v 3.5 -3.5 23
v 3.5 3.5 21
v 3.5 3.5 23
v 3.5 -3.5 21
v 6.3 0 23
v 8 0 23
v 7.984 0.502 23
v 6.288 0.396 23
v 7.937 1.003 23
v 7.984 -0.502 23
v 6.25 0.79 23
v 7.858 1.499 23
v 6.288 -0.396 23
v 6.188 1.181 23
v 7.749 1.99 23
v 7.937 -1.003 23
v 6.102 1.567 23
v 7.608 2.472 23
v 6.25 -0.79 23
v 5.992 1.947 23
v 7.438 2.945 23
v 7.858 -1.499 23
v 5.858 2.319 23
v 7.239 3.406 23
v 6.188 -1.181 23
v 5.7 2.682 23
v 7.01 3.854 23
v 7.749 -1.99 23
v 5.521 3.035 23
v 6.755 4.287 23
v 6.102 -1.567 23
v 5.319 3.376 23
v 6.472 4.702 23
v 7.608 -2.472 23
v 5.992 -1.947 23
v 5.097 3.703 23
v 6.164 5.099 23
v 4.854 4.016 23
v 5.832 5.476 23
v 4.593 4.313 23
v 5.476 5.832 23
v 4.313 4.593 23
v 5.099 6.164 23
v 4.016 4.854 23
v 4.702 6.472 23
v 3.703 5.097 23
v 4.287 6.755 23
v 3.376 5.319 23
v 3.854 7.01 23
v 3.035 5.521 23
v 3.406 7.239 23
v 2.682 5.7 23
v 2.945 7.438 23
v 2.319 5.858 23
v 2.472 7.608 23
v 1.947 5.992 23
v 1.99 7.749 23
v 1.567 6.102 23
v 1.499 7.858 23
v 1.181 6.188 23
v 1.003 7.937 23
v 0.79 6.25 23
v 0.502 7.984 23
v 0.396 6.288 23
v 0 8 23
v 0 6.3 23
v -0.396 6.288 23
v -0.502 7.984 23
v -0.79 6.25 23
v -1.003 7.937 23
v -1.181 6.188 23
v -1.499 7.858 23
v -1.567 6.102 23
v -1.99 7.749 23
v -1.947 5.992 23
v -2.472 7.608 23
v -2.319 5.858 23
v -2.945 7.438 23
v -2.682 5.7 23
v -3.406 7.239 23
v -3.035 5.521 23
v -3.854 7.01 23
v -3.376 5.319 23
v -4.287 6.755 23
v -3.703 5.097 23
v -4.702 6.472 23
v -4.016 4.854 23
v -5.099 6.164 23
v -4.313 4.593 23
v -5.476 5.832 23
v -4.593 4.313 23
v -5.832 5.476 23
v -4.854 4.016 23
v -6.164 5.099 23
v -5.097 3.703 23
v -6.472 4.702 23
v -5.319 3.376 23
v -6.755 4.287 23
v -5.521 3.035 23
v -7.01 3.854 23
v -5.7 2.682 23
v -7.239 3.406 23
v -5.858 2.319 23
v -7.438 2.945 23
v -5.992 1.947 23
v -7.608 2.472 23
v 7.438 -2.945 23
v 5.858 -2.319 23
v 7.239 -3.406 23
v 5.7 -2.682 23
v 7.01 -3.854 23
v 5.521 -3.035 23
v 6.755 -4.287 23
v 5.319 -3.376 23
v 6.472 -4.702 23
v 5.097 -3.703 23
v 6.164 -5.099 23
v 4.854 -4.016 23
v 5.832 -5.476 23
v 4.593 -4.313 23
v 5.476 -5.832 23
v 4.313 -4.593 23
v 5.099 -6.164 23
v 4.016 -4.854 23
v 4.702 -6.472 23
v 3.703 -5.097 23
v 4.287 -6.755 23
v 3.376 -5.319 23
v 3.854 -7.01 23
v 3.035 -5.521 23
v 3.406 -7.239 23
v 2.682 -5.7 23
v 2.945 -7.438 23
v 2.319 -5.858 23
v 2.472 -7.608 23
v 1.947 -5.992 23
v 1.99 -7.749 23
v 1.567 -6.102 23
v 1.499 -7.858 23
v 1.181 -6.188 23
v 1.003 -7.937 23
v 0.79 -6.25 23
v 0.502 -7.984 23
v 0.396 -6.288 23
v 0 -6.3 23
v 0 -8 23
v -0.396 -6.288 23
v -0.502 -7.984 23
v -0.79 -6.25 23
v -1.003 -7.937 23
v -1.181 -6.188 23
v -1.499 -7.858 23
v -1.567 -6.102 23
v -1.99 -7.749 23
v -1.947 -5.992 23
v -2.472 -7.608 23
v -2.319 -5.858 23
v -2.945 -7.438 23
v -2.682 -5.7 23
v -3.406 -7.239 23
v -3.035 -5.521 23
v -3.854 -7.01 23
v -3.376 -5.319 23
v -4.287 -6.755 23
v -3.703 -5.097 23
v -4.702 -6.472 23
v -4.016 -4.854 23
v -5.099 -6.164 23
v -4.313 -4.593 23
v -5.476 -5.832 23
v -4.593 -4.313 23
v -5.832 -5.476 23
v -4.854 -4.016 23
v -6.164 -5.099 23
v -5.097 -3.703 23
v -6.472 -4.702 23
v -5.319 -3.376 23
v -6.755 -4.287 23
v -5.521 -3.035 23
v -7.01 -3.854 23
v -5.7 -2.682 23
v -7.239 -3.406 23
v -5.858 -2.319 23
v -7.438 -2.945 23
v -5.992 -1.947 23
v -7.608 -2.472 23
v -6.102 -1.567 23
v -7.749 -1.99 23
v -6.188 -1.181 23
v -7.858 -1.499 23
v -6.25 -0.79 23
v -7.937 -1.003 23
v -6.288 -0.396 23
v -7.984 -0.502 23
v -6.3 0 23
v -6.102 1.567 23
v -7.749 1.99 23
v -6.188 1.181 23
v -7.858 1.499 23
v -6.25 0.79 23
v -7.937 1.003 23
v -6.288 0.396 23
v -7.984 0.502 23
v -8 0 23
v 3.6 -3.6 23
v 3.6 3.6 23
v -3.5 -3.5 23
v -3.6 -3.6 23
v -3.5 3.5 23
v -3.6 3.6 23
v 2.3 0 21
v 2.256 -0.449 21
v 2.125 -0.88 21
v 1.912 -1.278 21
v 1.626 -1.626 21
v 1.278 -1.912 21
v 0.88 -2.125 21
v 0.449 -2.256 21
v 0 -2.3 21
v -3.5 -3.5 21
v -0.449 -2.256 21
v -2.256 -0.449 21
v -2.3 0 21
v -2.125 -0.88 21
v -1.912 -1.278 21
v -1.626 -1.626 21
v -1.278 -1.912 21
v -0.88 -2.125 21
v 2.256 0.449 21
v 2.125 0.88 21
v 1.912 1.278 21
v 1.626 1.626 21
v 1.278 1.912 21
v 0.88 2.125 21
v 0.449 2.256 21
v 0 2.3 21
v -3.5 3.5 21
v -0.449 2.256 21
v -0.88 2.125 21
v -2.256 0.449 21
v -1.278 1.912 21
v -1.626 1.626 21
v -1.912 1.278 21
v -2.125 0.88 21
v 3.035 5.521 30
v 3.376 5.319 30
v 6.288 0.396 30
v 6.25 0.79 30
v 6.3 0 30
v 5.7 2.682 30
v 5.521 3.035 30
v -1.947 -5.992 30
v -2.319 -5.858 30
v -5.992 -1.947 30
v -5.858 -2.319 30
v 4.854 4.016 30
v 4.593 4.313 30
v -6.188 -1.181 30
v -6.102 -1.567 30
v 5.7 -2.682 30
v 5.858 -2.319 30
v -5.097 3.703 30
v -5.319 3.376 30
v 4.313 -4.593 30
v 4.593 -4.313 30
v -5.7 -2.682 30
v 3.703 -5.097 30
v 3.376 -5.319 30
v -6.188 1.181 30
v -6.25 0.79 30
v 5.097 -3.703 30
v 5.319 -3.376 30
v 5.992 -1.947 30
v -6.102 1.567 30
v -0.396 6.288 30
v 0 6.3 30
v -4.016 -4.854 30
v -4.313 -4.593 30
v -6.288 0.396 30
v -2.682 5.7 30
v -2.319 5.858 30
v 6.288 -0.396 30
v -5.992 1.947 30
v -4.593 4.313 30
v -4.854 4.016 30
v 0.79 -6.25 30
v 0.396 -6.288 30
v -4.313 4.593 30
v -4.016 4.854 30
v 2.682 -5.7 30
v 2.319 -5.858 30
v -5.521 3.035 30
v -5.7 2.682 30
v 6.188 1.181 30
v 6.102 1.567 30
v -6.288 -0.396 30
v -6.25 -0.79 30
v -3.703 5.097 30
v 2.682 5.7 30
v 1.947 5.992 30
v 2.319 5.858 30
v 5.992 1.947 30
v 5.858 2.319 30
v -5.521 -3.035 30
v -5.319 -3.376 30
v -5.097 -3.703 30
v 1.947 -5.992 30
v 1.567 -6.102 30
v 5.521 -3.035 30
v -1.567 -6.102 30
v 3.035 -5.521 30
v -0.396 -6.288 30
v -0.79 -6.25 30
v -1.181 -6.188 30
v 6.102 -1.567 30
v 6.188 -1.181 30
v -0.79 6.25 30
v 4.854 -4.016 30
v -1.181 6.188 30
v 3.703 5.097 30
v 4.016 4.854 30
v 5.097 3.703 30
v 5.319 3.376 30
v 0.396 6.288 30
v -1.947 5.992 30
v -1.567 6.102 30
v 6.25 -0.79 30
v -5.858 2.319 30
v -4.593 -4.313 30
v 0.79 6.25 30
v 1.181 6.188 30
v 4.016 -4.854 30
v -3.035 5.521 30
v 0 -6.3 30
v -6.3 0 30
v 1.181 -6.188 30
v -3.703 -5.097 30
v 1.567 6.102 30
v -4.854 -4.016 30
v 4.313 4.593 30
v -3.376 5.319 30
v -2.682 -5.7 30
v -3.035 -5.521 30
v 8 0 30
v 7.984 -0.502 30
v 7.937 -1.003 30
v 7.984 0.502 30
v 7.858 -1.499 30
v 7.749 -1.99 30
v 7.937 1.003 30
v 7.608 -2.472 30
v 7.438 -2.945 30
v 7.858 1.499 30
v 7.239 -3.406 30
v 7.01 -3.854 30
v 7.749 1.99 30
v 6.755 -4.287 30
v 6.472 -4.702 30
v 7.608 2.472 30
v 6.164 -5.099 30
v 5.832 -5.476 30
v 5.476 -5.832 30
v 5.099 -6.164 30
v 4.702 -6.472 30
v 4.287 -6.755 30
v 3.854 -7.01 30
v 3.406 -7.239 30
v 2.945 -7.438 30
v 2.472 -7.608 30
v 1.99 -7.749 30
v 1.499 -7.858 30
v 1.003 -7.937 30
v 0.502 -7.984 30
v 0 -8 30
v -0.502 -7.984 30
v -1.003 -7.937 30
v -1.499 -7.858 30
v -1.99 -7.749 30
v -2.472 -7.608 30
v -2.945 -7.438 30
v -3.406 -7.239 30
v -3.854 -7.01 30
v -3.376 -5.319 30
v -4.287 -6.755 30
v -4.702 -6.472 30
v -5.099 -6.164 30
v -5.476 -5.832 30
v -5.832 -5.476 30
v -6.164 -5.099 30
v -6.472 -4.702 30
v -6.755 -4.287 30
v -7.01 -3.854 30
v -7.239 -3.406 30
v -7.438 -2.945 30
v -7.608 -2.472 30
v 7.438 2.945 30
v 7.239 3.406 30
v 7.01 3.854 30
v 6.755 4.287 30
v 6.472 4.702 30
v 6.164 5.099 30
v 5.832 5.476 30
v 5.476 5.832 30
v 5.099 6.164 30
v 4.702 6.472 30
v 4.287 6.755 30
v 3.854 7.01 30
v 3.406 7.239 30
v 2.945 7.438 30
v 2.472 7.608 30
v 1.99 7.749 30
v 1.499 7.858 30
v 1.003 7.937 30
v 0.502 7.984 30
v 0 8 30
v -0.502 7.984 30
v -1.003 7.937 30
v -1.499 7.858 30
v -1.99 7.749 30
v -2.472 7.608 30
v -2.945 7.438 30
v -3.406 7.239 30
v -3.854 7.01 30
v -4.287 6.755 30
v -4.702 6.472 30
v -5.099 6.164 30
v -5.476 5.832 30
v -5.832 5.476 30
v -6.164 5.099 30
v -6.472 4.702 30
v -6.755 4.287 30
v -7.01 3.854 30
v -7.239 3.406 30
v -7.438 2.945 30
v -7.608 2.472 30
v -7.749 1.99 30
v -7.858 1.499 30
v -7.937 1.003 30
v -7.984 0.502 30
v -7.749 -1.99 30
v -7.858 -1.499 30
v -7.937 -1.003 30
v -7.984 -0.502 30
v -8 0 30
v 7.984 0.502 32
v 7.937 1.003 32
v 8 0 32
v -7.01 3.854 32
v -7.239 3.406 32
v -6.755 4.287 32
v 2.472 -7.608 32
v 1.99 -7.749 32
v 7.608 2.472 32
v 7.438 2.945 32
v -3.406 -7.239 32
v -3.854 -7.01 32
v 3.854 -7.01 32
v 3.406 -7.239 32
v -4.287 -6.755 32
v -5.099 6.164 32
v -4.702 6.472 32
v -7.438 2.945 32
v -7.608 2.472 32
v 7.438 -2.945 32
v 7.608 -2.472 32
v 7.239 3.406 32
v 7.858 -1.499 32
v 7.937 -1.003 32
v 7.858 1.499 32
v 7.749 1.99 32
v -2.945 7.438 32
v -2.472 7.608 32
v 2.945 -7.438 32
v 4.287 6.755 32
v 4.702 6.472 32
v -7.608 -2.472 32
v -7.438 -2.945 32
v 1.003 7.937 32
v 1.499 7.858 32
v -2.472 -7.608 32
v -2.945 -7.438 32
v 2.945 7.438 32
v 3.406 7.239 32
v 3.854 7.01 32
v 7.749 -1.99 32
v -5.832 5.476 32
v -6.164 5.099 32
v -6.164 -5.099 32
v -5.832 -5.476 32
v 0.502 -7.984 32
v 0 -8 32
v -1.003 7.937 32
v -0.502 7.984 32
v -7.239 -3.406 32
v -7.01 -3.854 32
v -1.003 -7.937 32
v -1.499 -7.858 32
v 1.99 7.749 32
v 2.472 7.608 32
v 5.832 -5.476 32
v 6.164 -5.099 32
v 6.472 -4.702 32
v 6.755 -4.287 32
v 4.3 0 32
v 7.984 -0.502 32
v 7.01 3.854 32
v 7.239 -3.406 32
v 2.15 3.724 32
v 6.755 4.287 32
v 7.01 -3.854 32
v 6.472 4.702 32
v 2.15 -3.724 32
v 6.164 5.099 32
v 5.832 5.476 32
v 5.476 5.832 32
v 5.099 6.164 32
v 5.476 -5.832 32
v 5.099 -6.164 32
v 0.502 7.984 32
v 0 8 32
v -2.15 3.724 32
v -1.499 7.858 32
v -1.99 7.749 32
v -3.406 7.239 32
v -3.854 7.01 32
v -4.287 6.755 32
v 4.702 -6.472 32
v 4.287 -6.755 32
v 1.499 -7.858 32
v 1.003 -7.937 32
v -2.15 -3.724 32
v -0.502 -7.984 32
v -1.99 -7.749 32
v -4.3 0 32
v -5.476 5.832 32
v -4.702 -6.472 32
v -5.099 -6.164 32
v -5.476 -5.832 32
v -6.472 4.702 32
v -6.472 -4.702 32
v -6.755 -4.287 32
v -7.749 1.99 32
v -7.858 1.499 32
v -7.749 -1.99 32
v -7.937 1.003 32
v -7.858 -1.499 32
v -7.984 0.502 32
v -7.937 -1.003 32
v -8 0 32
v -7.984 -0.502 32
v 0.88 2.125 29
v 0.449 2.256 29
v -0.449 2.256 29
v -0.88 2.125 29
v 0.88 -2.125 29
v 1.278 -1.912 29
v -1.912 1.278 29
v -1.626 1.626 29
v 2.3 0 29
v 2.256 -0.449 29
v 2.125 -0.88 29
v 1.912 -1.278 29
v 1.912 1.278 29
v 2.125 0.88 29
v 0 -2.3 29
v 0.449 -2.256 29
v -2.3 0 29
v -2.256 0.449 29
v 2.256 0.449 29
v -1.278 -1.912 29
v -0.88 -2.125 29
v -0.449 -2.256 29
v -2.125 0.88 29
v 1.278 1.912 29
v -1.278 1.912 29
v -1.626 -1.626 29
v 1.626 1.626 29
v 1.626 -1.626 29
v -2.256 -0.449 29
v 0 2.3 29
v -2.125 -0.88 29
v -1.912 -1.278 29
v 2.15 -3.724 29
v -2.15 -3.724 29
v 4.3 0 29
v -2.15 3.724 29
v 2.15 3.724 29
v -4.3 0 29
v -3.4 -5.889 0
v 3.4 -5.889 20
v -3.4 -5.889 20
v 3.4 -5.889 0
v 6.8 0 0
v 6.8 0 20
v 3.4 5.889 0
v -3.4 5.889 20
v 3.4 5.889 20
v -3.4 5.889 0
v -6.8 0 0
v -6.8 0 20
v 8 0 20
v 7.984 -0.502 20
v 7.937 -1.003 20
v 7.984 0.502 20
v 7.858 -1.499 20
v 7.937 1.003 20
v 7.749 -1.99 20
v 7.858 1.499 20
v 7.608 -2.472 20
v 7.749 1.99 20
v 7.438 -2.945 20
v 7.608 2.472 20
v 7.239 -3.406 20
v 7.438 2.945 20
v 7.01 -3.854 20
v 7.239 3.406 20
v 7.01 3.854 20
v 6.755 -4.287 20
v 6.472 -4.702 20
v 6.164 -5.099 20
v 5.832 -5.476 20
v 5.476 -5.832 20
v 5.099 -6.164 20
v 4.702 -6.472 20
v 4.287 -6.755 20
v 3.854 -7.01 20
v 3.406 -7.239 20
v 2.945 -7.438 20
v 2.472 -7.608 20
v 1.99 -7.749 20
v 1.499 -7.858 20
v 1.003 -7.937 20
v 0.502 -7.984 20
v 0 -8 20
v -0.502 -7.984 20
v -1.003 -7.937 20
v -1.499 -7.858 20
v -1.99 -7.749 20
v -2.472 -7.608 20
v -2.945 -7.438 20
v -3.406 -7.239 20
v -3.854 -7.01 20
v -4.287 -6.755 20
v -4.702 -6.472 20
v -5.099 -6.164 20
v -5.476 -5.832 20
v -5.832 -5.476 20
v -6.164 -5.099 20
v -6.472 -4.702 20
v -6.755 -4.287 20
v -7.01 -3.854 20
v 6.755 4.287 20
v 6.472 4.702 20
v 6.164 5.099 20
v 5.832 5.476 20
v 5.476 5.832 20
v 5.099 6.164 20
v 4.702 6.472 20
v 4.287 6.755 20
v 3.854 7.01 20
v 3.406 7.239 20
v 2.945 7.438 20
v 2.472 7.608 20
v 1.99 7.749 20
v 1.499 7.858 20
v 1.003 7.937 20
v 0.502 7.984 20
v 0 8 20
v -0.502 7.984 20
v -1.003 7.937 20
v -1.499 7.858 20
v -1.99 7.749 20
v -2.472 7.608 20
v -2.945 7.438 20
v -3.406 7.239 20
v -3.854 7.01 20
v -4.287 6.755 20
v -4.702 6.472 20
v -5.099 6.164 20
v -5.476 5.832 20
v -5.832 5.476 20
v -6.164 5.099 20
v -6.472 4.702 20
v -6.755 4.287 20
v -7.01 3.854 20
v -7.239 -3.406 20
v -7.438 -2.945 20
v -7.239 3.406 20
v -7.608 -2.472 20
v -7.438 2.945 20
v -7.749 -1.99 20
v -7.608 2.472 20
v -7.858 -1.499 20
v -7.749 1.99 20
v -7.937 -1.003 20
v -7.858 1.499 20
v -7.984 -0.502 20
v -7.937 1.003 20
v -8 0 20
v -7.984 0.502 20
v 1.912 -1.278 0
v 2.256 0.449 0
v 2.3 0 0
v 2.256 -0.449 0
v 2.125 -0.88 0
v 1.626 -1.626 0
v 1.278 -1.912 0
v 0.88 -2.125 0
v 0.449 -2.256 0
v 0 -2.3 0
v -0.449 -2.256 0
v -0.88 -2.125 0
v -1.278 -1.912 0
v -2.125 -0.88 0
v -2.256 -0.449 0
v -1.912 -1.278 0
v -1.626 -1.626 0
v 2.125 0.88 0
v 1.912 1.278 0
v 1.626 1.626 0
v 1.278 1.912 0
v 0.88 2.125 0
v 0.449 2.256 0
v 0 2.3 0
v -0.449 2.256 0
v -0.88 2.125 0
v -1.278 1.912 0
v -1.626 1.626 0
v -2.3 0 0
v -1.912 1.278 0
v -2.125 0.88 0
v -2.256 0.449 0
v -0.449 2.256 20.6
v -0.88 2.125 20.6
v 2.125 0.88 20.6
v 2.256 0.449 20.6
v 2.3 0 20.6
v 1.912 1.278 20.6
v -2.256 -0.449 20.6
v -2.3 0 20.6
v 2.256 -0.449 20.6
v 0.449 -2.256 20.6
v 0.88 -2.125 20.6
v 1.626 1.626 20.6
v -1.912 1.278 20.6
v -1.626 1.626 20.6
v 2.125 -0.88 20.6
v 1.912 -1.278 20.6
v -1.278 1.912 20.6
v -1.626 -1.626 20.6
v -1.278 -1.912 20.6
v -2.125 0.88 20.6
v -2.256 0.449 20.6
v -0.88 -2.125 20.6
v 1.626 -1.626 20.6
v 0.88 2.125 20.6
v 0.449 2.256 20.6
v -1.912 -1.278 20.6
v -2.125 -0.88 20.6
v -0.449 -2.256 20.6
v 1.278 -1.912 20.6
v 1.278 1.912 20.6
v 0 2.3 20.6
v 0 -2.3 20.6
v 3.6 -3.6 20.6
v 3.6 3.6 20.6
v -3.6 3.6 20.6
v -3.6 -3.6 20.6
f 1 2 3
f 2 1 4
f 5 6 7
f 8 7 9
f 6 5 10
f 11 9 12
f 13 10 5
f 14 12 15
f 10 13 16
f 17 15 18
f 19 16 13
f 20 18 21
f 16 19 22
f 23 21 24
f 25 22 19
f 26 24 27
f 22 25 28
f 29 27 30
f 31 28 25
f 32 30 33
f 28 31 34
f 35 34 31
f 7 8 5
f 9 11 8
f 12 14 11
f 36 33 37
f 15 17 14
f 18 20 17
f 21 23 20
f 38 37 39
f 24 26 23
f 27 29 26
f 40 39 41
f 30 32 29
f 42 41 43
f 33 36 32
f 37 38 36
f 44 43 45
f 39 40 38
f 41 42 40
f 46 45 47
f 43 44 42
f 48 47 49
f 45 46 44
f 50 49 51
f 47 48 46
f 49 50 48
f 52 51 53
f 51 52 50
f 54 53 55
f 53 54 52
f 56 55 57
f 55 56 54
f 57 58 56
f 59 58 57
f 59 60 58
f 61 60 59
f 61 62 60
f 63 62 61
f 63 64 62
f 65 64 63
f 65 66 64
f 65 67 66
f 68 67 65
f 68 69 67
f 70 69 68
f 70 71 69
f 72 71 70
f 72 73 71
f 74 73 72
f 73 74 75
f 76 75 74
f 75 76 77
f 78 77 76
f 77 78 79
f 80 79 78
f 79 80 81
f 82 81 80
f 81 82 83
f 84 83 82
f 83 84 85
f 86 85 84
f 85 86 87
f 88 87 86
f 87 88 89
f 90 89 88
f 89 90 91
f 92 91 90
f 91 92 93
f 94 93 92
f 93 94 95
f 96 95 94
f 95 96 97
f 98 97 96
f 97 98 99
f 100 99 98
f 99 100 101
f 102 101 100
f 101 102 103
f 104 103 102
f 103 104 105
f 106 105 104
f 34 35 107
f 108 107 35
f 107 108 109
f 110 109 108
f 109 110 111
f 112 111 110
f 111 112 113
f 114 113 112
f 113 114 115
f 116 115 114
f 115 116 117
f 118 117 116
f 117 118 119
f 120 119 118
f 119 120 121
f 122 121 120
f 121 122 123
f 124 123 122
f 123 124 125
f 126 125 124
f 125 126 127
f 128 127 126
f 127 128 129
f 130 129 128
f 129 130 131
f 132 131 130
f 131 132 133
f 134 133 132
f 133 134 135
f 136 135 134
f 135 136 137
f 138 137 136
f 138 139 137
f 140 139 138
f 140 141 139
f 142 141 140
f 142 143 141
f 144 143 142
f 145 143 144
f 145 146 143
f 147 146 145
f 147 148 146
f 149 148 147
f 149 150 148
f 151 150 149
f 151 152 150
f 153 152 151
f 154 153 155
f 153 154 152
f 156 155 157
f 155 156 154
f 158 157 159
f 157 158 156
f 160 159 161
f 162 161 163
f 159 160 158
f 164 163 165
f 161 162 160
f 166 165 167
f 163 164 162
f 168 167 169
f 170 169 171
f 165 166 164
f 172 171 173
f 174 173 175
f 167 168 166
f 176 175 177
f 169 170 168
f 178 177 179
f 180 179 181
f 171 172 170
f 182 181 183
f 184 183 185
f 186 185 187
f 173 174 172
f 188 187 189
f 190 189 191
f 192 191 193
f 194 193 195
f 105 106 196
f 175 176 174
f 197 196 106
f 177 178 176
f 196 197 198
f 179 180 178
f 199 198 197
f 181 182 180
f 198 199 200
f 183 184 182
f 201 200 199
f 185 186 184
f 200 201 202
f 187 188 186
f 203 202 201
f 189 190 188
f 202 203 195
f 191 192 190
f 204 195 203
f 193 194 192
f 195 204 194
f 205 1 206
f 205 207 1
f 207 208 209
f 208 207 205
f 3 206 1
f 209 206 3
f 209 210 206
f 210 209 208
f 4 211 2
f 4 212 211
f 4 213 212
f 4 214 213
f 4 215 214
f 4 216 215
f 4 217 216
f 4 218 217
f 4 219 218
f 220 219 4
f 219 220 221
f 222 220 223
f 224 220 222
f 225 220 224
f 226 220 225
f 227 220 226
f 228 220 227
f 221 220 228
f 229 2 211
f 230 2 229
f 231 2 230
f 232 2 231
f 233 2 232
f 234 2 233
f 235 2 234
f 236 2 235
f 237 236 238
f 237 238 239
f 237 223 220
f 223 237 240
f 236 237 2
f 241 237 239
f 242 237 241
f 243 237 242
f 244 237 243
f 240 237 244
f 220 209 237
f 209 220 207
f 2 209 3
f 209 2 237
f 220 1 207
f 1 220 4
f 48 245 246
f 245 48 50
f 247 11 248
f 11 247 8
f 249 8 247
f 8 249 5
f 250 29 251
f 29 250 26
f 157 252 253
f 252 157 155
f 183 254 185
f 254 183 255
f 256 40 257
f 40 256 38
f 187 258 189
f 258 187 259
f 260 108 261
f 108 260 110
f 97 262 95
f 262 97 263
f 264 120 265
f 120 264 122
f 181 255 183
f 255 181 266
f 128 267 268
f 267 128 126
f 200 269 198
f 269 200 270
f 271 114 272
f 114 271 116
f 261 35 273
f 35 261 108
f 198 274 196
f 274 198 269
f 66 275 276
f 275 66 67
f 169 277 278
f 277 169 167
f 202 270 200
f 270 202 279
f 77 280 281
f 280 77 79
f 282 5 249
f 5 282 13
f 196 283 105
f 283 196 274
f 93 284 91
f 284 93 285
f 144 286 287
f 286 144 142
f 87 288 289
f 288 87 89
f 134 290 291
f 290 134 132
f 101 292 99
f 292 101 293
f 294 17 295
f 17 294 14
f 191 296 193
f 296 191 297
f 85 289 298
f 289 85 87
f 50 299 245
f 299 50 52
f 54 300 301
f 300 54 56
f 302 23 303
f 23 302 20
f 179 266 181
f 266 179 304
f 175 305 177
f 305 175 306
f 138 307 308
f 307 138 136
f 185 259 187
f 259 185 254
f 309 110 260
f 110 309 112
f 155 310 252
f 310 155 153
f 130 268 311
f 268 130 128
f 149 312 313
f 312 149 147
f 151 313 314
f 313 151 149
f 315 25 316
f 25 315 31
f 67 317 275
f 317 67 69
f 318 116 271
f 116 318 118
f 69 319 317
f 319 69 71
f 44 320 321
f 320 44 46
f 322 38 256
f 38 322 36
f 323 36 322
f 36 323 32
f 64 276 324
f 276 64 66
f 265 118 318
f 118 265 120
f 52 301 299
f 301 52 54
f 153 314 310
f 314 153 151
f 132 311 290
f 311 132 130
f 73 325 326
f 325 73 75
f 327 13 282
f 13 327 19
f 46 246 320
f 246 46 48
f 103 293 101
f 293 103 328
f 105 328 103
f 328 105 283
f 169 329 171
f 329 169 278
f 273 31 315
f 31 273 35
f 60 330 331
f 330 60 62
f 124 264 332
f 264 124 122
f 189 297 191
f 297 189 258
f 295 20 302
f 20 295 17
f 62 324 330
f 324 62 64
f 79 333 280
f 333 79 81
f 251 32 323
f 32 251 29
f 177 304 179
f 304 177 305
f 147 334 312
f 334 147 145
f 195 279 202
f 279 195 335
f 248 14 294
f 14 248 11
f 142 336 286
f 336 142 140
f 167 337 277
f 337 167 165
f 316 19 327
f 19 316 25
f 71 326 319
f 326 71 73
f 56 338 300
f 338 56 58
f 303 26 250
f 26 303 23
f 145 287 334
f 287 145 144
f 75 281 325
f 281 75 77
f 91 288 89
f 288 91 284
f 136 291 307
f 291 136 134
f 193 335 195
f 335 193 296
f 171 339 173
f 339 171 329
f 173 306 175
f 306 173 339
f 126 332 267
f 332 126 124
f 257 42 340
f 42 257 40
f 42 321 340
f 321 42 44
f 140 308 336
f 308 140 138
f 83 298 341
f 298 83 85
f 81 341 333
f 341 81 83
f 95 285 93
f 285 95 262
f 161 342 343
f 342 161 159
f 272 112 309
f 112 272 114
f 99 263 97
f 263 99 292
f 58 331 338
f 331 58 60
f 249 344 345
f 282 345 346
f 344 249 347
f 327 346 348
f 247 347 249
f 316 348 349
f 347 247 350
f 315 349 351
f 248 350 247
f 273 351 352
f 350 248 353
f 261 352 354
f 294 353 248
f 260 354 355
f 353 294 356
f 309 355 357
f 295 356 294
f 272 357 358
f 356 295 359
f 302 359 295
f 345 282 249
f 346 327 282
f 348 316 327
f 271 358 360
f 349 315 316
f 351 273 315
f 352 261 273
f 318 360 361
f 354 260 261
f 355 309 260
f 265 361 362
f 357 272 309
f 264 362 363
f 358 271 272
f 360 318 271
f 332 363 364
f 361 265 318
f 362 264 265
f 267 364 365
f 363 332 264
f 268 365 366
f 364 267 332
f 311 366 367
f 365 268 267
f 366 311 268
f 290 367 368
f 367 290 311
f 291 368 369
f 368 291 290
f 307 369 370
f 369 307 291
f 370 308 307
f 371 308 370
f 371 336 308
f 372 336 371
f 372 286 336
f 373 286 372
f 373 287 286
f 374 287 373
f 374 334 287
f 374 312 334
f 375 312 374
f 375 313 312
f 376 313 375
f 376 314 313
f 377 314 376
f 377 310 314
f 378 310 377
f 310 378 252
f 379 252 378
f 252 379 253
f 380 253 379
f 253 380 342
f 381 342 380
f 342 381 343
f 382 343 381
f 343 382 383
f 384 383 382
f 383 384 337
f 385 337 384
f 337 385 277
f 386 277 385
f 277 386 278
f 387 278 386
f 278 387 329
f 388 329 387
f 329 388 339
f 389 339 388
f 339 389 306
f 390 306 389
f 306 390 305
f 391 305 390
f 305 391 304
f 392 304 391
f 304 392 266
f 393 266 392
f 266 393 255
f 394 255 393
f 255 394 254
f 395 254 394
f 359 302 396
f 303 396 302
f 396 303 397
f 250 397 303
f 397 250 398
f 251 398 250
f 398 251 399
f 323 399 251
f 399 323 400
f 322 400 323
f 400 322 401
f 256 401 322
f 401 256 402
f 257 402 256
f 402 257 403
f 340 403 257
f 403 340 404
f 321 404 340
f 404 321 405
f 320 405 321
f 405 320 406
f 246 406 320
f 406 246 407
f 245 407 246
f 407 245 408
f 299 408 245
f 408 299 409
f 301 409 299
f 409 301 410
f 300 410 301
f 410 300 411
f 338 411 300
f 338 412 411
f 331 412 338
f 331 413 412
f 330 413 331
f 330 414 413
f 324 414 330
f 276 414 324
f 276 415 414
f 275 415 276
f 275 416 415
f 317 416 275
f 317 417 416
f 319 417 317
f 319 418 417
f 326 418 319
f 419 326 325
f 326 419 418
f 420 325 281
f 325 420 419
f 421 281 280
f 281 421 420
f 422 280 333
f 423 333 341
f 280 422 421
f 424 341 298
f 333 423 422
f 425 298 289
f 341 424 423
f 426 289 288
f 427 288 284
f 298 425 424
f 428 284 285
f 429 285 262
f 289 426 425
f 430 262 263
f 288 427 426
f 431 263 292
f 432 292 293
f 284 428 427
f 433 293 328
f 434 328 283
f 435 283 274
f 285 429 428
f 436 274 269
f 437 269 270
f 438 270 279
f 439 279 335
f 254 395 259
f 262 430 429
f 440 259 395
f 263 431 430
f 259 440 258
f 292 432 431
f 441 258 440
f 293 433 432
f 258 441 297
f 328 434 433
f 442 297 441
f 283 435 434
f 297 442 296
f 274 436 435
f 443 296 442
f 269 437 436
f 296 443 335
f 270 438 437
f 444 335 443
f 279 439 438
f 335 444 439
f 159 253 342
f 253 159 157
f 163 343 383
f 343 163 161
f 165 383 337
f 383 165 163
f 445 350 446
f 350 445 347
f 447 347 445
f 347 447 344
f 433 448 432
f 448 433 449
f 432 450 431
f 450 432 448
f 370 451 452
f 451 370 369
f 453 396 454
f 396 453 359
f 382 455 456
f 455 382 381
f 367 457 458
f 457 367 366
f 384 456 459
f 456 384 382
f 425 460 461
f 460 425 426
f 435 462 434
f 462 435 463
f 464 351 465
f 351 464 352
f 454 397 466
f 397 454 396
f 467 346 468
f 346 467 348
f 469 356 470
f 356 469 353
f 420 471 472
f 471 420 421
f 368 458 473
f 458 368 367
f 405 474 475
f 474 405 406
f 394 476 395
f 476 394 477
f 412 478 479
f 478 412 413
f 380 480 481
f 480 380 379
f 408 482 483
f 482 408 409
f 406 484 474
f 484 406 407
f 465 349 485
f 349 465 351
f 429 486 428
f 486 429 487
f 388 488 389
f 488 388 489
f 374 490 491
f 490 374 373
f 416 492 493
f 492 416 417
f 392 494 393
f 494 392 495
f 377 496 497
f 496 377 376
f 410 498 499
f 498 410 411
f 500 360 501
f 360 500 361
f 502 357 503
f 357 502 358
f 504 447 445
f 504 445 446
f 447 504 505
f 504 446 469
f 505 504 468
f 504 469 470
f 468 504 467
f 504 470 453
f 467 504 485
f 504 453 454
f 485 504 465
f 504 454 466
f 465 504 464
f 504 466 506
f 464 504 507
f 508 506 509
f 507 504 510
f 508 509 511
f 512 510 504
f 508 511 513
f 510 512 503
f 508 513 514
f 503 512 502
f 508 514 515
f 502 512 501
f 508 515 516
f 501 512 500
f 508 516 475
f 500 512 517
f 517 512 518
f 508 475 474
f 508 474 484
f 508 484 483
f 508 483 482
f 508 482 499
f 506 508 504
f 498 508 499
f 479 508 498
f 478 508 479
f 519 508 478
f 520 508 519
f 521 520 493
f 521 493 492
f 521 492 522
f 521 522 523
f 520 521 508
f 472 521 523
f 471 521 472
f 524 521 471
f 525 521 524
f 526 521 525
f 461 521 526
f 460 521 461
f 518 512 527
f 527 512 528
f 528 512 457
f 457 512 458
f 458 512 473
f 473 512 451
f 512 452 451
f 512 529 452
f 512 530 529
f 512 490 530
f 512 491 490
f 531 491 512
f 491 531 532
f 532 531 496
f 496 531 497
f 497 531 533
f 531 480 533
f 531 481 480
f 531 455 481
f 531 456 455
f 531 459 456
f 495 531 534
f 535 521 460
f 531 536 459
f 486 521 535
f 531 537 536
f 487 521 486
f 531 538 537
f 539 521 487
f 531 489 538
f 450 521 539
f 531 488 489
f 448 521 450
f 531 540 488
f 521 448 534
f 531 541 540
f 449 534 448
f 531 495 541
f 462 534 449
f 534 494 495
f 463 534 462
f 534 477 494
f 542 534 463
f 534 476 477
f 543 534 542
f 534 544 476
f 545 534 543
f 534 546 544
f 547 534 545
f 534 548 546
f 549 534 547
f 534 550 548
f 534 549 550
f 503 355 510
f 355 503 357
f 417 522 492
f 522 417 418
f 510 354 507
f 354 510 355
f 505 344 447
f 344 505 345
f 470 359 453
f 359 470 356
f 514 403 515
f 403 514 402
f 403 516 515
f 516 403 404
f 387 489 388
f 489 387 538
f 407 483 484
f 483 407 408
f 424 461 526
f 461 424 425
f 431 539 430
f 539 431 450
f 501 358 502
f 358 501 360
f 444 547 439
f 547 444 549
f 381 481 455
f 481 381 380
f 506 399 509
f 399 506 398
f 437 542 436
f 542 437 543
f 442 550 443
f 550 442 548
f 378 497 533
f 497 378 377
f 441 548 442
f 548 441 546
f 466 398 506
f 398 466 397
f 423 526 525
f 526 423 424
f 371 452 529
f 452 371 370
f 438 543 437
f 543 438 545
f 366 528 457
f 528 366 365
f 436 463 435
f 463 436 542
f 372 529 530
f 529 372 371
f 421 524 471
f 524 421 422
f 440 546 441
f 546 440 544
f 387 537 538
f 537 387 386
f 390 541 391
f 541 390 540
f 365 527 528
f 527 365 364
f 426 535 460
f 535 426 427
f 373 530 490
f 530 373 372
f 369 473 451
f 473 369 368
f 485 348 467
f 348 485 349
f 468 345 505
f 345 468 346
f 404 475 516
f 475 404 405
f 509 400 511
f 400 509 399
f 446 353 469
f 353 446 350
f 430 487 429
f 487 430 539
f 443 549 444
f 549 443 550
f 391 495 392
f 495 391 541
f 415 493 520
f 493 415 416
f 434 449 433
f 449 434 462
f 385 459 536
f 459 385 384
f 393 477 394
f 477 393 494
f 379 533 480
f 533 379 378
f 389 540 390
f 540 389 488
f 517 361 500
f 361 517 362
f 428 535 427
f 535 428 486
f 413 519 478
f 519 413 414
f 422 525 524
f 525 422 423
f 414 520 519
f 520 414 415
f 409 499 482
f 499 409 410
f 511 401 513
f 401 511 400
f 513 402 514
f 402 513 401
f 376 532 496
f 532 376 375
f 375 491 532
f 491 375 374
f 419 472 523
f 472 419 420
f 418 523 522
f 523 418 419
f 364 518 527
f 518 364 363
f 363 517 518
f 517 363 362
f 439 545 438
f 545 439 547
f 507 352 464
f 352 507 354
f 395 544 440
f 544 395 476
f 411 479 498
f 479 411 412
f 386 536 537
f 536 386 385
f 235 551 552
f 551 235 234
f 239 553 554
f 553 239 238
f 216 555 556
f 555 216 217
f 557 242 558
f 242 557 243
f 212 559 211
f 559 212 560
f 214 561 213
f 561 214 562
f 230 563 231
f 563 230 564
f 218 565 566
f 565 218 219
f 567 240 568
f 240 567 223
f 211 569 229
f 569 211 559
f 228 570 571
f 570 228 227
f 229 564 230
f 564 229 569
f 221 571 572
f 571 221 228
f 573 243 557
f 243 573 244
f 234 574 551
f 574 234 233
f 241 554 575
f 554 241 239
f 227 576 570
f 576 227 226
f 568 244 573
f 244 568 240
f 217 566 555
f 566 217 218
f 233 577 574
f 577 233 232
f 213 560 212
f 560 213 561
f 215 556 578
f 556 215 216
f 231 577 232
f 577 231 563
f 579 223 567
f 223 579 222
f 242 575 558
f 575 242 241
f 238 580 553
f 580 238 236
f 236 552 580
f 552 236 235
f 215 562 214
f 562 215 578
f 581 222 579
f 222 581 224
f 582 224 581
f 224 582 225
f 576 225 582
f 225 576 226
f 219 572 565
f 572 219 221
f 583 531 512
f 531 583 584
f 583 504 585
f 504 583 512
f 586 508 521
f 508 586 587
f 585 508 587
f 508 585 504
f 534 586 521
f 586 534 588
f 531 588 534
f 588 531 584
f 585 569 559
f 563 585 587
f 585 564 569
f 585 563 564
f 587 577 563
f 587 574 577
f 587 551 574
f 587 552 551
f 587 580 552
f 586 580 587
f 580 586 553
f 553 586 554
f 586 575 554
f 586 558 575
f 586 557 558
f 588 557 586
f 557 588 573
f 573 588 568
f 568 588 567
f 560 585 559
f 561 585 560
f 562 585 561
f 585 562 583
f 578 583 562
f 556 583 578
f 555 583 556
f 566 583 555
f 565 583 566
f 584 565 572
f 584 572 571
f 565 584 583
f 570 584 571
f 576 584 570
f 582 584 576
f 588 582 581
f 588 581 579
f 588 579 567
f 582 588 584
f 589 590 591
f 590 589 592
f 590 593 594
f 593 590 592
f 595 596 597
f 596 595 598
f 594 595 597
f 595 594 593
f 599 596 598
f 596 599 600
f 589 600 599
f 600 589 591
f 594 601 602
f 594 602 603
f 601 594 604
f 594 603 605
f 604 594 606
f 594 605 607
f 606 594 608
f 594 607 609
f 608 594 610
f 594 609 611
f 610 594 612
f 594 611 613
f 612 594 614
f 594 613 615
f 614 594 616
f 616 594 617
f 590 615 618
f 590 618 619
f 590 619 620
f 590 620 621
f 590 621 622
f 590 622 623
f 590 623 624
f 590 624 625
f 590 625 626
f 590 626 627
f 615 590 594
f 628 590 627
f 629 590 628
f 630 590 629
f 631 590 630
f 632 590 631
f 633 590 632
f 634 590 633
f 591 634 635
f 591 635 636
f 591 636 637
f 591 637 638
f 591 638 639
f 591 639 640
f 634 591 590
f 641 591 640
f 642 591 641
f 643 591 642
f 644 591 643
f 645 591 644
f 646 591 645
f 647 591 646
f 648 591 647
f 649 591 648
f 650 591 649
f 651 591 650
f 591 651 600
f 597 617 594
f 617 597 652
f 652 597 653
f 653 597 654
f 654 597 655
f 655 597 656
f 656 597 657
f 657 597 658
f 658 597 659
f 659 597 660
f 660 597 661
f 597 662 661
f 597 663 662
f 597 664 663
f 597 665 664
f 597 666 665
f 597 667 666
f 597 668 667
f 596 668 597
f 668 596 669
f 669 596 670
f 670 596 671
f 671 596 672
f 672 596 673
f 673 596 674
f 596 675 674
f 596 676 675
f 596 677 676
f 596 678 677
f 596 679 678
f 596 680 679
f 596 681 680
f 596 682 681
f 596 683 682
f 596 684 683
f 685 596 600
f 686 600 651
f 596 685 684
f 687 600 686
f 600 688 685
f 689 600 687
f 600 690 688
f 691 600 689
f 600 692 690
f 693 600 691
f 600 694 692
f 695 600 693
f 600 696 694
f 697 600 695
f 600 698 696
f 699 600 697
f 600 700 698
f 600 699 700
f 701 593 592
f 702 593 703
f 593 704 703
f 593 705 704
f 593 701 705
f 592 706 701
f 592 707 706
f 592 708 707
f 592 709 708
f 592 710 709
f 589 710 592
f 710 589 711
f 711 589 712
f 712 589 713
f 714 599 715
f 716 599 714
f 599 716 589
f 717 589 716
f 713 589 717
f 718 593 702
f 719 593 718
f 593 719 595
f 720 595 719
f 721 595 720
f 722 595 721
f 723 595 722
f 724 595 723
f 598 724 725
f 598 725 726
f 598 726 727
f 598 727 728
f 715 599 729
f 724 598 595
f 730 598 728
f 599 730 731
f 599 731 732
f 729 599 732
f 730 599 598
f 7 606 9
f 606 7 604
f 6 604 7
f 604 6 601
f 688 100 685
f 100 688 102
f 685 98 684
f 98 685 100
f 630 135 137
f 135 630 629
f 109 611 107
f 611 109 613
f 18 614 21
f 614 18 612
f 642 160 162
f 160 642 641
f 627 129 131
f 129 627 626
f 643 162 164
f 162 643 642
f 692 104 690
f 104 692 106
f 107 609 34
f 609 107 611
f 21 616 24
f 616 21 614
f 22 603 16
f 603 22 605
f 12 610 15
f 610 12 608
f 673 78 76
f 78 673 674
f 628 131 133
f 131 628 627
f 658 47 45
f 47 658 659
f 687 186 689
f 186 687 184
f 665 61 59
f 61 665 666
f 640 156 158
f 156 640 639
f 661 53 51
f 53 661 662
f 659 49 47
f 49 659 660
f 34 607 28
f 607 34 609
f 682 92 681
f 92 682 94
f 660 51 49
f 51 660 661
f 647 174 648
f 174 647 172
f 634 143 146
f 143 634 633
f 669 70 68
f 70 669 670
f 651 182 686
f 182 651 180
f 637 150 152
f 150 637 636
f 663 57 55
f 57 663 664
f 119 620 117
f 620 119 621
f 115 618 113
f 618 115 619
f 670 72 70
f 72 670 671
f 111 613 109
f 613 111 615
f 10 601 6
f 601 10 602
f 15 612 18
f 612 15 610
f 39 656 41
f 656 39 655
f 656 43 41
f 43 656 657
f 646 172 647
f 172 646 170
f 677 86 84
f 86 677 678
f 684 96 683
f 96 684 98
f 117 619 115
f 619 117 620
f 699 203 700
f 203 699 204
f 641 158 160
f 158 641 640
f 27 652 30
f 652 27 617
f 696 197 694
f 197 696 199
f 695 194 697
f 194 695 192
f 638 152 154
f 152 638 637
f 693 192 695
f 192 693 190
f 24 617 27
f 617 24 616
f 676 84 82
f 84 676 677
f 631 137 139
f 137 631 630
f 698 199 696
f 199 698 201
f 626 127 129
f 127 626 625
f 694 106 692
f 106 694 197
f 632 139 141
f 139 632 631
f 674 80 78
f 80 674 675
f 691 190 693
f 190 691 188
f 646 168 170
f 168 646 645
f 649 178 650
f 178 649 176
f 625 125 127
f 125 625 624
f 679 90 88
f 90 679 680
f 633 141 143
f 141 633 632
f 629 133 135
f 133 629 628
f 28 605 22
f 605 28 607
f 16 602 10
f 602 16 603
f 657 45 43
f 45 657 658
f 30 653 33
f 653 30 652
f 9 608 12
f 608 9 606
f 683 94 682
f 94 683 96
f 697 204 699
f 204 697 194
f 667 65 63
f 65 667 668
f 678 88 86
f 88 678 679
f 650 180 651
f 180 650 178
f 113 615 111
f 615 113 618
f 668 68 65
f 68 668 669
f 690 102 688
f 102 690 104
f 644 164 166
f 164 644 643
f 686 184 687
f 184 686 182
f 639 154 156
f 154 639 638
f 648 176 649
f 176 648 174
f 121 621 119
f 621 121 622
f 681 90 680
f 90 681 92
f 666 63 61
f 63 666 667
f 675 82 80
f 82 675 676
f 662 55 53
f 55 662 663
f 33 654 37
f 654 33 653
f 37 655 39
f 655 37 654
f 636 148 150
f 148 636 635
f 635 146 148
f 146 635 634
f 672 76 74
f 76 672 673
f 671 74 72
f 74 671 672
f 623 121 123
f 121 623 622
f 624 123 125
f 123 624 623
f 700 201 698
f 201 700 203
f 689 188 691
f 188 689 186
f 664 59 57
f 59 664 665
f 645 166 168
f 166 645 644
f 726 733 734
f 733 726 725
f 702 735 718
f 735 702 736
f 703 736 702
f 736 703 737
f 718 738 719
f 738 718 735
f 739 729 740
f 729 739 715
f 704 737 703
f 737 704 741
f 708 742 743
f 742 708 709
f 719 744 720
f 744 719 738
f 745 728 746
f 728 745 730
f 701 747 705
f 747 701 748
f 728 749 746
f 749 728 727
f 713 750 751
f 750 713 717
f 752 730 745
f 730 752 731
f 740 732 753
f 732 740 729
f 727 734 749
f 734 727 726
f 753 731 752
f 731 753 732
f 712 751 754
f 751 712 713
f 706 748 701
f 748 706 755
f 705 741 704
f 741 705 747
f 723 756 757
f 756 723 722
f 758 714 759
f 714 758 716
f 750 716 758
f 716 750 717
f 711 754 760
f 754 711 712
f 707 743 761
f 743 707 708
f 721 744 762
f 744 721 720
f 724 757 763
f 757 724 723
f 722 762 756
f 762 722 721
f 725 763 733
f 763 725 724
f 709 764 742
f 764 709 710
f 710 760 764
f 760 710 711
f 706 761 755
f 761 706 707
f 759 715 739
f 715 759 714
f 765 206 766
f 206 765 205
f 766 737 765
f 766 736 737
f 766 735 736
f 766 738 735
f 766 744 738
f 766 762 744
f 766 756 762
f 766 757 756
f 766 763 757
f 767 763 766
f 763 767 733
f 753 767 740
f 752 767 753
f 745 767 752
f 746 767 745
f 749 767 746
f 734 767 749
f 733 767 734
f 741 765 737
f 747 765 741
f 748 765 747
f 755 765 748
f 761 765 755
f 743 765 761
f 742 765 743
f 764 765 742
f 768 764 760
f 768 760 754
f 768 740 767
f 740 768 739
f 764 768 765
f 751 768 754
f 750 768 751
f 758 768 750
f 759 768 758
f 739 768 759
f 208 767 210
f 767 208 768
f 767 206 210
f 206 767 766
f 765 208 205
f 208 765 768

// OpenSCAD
qs=7;
qh=2;
translate([0,0,23]) part2();
part1();

module part2() {
    h=6.8+.2;
    difference() {
        union() {
            translate([0,0,-qh]) translate([-qs/2,-qs/2,0]) cube([qs,qs,qh]);
            cylinder($fn=100, d=12.6, h=h);
            translate([0,0,h]) cylinder($fn=100, d=16, h=2);
        }
        translate([0,0,-qh]) cylinder($fn=32, d=4.6, h=h+qh+3);
        translate([0,0,h-1]) cylinder($fn=6, d=8.6, h=3.5);    
    }
}

module part1() {
    d = 0.2;
    h1 = 20;
    difference() {
        union() {
            cylinder($fn=6, d=13.6, h=h1);
            translate([0,0,h1]) cylinder($fn=100, d=16, h=3);
        }
        cylinder($fn=32, d=4.6, h=h1+3);
        translate([-qs/2-d/2,-qs/2-d/2,h1+3-qh-2*d]) cube([qs+d,qs+d,qh+d*2]);
    }
}
